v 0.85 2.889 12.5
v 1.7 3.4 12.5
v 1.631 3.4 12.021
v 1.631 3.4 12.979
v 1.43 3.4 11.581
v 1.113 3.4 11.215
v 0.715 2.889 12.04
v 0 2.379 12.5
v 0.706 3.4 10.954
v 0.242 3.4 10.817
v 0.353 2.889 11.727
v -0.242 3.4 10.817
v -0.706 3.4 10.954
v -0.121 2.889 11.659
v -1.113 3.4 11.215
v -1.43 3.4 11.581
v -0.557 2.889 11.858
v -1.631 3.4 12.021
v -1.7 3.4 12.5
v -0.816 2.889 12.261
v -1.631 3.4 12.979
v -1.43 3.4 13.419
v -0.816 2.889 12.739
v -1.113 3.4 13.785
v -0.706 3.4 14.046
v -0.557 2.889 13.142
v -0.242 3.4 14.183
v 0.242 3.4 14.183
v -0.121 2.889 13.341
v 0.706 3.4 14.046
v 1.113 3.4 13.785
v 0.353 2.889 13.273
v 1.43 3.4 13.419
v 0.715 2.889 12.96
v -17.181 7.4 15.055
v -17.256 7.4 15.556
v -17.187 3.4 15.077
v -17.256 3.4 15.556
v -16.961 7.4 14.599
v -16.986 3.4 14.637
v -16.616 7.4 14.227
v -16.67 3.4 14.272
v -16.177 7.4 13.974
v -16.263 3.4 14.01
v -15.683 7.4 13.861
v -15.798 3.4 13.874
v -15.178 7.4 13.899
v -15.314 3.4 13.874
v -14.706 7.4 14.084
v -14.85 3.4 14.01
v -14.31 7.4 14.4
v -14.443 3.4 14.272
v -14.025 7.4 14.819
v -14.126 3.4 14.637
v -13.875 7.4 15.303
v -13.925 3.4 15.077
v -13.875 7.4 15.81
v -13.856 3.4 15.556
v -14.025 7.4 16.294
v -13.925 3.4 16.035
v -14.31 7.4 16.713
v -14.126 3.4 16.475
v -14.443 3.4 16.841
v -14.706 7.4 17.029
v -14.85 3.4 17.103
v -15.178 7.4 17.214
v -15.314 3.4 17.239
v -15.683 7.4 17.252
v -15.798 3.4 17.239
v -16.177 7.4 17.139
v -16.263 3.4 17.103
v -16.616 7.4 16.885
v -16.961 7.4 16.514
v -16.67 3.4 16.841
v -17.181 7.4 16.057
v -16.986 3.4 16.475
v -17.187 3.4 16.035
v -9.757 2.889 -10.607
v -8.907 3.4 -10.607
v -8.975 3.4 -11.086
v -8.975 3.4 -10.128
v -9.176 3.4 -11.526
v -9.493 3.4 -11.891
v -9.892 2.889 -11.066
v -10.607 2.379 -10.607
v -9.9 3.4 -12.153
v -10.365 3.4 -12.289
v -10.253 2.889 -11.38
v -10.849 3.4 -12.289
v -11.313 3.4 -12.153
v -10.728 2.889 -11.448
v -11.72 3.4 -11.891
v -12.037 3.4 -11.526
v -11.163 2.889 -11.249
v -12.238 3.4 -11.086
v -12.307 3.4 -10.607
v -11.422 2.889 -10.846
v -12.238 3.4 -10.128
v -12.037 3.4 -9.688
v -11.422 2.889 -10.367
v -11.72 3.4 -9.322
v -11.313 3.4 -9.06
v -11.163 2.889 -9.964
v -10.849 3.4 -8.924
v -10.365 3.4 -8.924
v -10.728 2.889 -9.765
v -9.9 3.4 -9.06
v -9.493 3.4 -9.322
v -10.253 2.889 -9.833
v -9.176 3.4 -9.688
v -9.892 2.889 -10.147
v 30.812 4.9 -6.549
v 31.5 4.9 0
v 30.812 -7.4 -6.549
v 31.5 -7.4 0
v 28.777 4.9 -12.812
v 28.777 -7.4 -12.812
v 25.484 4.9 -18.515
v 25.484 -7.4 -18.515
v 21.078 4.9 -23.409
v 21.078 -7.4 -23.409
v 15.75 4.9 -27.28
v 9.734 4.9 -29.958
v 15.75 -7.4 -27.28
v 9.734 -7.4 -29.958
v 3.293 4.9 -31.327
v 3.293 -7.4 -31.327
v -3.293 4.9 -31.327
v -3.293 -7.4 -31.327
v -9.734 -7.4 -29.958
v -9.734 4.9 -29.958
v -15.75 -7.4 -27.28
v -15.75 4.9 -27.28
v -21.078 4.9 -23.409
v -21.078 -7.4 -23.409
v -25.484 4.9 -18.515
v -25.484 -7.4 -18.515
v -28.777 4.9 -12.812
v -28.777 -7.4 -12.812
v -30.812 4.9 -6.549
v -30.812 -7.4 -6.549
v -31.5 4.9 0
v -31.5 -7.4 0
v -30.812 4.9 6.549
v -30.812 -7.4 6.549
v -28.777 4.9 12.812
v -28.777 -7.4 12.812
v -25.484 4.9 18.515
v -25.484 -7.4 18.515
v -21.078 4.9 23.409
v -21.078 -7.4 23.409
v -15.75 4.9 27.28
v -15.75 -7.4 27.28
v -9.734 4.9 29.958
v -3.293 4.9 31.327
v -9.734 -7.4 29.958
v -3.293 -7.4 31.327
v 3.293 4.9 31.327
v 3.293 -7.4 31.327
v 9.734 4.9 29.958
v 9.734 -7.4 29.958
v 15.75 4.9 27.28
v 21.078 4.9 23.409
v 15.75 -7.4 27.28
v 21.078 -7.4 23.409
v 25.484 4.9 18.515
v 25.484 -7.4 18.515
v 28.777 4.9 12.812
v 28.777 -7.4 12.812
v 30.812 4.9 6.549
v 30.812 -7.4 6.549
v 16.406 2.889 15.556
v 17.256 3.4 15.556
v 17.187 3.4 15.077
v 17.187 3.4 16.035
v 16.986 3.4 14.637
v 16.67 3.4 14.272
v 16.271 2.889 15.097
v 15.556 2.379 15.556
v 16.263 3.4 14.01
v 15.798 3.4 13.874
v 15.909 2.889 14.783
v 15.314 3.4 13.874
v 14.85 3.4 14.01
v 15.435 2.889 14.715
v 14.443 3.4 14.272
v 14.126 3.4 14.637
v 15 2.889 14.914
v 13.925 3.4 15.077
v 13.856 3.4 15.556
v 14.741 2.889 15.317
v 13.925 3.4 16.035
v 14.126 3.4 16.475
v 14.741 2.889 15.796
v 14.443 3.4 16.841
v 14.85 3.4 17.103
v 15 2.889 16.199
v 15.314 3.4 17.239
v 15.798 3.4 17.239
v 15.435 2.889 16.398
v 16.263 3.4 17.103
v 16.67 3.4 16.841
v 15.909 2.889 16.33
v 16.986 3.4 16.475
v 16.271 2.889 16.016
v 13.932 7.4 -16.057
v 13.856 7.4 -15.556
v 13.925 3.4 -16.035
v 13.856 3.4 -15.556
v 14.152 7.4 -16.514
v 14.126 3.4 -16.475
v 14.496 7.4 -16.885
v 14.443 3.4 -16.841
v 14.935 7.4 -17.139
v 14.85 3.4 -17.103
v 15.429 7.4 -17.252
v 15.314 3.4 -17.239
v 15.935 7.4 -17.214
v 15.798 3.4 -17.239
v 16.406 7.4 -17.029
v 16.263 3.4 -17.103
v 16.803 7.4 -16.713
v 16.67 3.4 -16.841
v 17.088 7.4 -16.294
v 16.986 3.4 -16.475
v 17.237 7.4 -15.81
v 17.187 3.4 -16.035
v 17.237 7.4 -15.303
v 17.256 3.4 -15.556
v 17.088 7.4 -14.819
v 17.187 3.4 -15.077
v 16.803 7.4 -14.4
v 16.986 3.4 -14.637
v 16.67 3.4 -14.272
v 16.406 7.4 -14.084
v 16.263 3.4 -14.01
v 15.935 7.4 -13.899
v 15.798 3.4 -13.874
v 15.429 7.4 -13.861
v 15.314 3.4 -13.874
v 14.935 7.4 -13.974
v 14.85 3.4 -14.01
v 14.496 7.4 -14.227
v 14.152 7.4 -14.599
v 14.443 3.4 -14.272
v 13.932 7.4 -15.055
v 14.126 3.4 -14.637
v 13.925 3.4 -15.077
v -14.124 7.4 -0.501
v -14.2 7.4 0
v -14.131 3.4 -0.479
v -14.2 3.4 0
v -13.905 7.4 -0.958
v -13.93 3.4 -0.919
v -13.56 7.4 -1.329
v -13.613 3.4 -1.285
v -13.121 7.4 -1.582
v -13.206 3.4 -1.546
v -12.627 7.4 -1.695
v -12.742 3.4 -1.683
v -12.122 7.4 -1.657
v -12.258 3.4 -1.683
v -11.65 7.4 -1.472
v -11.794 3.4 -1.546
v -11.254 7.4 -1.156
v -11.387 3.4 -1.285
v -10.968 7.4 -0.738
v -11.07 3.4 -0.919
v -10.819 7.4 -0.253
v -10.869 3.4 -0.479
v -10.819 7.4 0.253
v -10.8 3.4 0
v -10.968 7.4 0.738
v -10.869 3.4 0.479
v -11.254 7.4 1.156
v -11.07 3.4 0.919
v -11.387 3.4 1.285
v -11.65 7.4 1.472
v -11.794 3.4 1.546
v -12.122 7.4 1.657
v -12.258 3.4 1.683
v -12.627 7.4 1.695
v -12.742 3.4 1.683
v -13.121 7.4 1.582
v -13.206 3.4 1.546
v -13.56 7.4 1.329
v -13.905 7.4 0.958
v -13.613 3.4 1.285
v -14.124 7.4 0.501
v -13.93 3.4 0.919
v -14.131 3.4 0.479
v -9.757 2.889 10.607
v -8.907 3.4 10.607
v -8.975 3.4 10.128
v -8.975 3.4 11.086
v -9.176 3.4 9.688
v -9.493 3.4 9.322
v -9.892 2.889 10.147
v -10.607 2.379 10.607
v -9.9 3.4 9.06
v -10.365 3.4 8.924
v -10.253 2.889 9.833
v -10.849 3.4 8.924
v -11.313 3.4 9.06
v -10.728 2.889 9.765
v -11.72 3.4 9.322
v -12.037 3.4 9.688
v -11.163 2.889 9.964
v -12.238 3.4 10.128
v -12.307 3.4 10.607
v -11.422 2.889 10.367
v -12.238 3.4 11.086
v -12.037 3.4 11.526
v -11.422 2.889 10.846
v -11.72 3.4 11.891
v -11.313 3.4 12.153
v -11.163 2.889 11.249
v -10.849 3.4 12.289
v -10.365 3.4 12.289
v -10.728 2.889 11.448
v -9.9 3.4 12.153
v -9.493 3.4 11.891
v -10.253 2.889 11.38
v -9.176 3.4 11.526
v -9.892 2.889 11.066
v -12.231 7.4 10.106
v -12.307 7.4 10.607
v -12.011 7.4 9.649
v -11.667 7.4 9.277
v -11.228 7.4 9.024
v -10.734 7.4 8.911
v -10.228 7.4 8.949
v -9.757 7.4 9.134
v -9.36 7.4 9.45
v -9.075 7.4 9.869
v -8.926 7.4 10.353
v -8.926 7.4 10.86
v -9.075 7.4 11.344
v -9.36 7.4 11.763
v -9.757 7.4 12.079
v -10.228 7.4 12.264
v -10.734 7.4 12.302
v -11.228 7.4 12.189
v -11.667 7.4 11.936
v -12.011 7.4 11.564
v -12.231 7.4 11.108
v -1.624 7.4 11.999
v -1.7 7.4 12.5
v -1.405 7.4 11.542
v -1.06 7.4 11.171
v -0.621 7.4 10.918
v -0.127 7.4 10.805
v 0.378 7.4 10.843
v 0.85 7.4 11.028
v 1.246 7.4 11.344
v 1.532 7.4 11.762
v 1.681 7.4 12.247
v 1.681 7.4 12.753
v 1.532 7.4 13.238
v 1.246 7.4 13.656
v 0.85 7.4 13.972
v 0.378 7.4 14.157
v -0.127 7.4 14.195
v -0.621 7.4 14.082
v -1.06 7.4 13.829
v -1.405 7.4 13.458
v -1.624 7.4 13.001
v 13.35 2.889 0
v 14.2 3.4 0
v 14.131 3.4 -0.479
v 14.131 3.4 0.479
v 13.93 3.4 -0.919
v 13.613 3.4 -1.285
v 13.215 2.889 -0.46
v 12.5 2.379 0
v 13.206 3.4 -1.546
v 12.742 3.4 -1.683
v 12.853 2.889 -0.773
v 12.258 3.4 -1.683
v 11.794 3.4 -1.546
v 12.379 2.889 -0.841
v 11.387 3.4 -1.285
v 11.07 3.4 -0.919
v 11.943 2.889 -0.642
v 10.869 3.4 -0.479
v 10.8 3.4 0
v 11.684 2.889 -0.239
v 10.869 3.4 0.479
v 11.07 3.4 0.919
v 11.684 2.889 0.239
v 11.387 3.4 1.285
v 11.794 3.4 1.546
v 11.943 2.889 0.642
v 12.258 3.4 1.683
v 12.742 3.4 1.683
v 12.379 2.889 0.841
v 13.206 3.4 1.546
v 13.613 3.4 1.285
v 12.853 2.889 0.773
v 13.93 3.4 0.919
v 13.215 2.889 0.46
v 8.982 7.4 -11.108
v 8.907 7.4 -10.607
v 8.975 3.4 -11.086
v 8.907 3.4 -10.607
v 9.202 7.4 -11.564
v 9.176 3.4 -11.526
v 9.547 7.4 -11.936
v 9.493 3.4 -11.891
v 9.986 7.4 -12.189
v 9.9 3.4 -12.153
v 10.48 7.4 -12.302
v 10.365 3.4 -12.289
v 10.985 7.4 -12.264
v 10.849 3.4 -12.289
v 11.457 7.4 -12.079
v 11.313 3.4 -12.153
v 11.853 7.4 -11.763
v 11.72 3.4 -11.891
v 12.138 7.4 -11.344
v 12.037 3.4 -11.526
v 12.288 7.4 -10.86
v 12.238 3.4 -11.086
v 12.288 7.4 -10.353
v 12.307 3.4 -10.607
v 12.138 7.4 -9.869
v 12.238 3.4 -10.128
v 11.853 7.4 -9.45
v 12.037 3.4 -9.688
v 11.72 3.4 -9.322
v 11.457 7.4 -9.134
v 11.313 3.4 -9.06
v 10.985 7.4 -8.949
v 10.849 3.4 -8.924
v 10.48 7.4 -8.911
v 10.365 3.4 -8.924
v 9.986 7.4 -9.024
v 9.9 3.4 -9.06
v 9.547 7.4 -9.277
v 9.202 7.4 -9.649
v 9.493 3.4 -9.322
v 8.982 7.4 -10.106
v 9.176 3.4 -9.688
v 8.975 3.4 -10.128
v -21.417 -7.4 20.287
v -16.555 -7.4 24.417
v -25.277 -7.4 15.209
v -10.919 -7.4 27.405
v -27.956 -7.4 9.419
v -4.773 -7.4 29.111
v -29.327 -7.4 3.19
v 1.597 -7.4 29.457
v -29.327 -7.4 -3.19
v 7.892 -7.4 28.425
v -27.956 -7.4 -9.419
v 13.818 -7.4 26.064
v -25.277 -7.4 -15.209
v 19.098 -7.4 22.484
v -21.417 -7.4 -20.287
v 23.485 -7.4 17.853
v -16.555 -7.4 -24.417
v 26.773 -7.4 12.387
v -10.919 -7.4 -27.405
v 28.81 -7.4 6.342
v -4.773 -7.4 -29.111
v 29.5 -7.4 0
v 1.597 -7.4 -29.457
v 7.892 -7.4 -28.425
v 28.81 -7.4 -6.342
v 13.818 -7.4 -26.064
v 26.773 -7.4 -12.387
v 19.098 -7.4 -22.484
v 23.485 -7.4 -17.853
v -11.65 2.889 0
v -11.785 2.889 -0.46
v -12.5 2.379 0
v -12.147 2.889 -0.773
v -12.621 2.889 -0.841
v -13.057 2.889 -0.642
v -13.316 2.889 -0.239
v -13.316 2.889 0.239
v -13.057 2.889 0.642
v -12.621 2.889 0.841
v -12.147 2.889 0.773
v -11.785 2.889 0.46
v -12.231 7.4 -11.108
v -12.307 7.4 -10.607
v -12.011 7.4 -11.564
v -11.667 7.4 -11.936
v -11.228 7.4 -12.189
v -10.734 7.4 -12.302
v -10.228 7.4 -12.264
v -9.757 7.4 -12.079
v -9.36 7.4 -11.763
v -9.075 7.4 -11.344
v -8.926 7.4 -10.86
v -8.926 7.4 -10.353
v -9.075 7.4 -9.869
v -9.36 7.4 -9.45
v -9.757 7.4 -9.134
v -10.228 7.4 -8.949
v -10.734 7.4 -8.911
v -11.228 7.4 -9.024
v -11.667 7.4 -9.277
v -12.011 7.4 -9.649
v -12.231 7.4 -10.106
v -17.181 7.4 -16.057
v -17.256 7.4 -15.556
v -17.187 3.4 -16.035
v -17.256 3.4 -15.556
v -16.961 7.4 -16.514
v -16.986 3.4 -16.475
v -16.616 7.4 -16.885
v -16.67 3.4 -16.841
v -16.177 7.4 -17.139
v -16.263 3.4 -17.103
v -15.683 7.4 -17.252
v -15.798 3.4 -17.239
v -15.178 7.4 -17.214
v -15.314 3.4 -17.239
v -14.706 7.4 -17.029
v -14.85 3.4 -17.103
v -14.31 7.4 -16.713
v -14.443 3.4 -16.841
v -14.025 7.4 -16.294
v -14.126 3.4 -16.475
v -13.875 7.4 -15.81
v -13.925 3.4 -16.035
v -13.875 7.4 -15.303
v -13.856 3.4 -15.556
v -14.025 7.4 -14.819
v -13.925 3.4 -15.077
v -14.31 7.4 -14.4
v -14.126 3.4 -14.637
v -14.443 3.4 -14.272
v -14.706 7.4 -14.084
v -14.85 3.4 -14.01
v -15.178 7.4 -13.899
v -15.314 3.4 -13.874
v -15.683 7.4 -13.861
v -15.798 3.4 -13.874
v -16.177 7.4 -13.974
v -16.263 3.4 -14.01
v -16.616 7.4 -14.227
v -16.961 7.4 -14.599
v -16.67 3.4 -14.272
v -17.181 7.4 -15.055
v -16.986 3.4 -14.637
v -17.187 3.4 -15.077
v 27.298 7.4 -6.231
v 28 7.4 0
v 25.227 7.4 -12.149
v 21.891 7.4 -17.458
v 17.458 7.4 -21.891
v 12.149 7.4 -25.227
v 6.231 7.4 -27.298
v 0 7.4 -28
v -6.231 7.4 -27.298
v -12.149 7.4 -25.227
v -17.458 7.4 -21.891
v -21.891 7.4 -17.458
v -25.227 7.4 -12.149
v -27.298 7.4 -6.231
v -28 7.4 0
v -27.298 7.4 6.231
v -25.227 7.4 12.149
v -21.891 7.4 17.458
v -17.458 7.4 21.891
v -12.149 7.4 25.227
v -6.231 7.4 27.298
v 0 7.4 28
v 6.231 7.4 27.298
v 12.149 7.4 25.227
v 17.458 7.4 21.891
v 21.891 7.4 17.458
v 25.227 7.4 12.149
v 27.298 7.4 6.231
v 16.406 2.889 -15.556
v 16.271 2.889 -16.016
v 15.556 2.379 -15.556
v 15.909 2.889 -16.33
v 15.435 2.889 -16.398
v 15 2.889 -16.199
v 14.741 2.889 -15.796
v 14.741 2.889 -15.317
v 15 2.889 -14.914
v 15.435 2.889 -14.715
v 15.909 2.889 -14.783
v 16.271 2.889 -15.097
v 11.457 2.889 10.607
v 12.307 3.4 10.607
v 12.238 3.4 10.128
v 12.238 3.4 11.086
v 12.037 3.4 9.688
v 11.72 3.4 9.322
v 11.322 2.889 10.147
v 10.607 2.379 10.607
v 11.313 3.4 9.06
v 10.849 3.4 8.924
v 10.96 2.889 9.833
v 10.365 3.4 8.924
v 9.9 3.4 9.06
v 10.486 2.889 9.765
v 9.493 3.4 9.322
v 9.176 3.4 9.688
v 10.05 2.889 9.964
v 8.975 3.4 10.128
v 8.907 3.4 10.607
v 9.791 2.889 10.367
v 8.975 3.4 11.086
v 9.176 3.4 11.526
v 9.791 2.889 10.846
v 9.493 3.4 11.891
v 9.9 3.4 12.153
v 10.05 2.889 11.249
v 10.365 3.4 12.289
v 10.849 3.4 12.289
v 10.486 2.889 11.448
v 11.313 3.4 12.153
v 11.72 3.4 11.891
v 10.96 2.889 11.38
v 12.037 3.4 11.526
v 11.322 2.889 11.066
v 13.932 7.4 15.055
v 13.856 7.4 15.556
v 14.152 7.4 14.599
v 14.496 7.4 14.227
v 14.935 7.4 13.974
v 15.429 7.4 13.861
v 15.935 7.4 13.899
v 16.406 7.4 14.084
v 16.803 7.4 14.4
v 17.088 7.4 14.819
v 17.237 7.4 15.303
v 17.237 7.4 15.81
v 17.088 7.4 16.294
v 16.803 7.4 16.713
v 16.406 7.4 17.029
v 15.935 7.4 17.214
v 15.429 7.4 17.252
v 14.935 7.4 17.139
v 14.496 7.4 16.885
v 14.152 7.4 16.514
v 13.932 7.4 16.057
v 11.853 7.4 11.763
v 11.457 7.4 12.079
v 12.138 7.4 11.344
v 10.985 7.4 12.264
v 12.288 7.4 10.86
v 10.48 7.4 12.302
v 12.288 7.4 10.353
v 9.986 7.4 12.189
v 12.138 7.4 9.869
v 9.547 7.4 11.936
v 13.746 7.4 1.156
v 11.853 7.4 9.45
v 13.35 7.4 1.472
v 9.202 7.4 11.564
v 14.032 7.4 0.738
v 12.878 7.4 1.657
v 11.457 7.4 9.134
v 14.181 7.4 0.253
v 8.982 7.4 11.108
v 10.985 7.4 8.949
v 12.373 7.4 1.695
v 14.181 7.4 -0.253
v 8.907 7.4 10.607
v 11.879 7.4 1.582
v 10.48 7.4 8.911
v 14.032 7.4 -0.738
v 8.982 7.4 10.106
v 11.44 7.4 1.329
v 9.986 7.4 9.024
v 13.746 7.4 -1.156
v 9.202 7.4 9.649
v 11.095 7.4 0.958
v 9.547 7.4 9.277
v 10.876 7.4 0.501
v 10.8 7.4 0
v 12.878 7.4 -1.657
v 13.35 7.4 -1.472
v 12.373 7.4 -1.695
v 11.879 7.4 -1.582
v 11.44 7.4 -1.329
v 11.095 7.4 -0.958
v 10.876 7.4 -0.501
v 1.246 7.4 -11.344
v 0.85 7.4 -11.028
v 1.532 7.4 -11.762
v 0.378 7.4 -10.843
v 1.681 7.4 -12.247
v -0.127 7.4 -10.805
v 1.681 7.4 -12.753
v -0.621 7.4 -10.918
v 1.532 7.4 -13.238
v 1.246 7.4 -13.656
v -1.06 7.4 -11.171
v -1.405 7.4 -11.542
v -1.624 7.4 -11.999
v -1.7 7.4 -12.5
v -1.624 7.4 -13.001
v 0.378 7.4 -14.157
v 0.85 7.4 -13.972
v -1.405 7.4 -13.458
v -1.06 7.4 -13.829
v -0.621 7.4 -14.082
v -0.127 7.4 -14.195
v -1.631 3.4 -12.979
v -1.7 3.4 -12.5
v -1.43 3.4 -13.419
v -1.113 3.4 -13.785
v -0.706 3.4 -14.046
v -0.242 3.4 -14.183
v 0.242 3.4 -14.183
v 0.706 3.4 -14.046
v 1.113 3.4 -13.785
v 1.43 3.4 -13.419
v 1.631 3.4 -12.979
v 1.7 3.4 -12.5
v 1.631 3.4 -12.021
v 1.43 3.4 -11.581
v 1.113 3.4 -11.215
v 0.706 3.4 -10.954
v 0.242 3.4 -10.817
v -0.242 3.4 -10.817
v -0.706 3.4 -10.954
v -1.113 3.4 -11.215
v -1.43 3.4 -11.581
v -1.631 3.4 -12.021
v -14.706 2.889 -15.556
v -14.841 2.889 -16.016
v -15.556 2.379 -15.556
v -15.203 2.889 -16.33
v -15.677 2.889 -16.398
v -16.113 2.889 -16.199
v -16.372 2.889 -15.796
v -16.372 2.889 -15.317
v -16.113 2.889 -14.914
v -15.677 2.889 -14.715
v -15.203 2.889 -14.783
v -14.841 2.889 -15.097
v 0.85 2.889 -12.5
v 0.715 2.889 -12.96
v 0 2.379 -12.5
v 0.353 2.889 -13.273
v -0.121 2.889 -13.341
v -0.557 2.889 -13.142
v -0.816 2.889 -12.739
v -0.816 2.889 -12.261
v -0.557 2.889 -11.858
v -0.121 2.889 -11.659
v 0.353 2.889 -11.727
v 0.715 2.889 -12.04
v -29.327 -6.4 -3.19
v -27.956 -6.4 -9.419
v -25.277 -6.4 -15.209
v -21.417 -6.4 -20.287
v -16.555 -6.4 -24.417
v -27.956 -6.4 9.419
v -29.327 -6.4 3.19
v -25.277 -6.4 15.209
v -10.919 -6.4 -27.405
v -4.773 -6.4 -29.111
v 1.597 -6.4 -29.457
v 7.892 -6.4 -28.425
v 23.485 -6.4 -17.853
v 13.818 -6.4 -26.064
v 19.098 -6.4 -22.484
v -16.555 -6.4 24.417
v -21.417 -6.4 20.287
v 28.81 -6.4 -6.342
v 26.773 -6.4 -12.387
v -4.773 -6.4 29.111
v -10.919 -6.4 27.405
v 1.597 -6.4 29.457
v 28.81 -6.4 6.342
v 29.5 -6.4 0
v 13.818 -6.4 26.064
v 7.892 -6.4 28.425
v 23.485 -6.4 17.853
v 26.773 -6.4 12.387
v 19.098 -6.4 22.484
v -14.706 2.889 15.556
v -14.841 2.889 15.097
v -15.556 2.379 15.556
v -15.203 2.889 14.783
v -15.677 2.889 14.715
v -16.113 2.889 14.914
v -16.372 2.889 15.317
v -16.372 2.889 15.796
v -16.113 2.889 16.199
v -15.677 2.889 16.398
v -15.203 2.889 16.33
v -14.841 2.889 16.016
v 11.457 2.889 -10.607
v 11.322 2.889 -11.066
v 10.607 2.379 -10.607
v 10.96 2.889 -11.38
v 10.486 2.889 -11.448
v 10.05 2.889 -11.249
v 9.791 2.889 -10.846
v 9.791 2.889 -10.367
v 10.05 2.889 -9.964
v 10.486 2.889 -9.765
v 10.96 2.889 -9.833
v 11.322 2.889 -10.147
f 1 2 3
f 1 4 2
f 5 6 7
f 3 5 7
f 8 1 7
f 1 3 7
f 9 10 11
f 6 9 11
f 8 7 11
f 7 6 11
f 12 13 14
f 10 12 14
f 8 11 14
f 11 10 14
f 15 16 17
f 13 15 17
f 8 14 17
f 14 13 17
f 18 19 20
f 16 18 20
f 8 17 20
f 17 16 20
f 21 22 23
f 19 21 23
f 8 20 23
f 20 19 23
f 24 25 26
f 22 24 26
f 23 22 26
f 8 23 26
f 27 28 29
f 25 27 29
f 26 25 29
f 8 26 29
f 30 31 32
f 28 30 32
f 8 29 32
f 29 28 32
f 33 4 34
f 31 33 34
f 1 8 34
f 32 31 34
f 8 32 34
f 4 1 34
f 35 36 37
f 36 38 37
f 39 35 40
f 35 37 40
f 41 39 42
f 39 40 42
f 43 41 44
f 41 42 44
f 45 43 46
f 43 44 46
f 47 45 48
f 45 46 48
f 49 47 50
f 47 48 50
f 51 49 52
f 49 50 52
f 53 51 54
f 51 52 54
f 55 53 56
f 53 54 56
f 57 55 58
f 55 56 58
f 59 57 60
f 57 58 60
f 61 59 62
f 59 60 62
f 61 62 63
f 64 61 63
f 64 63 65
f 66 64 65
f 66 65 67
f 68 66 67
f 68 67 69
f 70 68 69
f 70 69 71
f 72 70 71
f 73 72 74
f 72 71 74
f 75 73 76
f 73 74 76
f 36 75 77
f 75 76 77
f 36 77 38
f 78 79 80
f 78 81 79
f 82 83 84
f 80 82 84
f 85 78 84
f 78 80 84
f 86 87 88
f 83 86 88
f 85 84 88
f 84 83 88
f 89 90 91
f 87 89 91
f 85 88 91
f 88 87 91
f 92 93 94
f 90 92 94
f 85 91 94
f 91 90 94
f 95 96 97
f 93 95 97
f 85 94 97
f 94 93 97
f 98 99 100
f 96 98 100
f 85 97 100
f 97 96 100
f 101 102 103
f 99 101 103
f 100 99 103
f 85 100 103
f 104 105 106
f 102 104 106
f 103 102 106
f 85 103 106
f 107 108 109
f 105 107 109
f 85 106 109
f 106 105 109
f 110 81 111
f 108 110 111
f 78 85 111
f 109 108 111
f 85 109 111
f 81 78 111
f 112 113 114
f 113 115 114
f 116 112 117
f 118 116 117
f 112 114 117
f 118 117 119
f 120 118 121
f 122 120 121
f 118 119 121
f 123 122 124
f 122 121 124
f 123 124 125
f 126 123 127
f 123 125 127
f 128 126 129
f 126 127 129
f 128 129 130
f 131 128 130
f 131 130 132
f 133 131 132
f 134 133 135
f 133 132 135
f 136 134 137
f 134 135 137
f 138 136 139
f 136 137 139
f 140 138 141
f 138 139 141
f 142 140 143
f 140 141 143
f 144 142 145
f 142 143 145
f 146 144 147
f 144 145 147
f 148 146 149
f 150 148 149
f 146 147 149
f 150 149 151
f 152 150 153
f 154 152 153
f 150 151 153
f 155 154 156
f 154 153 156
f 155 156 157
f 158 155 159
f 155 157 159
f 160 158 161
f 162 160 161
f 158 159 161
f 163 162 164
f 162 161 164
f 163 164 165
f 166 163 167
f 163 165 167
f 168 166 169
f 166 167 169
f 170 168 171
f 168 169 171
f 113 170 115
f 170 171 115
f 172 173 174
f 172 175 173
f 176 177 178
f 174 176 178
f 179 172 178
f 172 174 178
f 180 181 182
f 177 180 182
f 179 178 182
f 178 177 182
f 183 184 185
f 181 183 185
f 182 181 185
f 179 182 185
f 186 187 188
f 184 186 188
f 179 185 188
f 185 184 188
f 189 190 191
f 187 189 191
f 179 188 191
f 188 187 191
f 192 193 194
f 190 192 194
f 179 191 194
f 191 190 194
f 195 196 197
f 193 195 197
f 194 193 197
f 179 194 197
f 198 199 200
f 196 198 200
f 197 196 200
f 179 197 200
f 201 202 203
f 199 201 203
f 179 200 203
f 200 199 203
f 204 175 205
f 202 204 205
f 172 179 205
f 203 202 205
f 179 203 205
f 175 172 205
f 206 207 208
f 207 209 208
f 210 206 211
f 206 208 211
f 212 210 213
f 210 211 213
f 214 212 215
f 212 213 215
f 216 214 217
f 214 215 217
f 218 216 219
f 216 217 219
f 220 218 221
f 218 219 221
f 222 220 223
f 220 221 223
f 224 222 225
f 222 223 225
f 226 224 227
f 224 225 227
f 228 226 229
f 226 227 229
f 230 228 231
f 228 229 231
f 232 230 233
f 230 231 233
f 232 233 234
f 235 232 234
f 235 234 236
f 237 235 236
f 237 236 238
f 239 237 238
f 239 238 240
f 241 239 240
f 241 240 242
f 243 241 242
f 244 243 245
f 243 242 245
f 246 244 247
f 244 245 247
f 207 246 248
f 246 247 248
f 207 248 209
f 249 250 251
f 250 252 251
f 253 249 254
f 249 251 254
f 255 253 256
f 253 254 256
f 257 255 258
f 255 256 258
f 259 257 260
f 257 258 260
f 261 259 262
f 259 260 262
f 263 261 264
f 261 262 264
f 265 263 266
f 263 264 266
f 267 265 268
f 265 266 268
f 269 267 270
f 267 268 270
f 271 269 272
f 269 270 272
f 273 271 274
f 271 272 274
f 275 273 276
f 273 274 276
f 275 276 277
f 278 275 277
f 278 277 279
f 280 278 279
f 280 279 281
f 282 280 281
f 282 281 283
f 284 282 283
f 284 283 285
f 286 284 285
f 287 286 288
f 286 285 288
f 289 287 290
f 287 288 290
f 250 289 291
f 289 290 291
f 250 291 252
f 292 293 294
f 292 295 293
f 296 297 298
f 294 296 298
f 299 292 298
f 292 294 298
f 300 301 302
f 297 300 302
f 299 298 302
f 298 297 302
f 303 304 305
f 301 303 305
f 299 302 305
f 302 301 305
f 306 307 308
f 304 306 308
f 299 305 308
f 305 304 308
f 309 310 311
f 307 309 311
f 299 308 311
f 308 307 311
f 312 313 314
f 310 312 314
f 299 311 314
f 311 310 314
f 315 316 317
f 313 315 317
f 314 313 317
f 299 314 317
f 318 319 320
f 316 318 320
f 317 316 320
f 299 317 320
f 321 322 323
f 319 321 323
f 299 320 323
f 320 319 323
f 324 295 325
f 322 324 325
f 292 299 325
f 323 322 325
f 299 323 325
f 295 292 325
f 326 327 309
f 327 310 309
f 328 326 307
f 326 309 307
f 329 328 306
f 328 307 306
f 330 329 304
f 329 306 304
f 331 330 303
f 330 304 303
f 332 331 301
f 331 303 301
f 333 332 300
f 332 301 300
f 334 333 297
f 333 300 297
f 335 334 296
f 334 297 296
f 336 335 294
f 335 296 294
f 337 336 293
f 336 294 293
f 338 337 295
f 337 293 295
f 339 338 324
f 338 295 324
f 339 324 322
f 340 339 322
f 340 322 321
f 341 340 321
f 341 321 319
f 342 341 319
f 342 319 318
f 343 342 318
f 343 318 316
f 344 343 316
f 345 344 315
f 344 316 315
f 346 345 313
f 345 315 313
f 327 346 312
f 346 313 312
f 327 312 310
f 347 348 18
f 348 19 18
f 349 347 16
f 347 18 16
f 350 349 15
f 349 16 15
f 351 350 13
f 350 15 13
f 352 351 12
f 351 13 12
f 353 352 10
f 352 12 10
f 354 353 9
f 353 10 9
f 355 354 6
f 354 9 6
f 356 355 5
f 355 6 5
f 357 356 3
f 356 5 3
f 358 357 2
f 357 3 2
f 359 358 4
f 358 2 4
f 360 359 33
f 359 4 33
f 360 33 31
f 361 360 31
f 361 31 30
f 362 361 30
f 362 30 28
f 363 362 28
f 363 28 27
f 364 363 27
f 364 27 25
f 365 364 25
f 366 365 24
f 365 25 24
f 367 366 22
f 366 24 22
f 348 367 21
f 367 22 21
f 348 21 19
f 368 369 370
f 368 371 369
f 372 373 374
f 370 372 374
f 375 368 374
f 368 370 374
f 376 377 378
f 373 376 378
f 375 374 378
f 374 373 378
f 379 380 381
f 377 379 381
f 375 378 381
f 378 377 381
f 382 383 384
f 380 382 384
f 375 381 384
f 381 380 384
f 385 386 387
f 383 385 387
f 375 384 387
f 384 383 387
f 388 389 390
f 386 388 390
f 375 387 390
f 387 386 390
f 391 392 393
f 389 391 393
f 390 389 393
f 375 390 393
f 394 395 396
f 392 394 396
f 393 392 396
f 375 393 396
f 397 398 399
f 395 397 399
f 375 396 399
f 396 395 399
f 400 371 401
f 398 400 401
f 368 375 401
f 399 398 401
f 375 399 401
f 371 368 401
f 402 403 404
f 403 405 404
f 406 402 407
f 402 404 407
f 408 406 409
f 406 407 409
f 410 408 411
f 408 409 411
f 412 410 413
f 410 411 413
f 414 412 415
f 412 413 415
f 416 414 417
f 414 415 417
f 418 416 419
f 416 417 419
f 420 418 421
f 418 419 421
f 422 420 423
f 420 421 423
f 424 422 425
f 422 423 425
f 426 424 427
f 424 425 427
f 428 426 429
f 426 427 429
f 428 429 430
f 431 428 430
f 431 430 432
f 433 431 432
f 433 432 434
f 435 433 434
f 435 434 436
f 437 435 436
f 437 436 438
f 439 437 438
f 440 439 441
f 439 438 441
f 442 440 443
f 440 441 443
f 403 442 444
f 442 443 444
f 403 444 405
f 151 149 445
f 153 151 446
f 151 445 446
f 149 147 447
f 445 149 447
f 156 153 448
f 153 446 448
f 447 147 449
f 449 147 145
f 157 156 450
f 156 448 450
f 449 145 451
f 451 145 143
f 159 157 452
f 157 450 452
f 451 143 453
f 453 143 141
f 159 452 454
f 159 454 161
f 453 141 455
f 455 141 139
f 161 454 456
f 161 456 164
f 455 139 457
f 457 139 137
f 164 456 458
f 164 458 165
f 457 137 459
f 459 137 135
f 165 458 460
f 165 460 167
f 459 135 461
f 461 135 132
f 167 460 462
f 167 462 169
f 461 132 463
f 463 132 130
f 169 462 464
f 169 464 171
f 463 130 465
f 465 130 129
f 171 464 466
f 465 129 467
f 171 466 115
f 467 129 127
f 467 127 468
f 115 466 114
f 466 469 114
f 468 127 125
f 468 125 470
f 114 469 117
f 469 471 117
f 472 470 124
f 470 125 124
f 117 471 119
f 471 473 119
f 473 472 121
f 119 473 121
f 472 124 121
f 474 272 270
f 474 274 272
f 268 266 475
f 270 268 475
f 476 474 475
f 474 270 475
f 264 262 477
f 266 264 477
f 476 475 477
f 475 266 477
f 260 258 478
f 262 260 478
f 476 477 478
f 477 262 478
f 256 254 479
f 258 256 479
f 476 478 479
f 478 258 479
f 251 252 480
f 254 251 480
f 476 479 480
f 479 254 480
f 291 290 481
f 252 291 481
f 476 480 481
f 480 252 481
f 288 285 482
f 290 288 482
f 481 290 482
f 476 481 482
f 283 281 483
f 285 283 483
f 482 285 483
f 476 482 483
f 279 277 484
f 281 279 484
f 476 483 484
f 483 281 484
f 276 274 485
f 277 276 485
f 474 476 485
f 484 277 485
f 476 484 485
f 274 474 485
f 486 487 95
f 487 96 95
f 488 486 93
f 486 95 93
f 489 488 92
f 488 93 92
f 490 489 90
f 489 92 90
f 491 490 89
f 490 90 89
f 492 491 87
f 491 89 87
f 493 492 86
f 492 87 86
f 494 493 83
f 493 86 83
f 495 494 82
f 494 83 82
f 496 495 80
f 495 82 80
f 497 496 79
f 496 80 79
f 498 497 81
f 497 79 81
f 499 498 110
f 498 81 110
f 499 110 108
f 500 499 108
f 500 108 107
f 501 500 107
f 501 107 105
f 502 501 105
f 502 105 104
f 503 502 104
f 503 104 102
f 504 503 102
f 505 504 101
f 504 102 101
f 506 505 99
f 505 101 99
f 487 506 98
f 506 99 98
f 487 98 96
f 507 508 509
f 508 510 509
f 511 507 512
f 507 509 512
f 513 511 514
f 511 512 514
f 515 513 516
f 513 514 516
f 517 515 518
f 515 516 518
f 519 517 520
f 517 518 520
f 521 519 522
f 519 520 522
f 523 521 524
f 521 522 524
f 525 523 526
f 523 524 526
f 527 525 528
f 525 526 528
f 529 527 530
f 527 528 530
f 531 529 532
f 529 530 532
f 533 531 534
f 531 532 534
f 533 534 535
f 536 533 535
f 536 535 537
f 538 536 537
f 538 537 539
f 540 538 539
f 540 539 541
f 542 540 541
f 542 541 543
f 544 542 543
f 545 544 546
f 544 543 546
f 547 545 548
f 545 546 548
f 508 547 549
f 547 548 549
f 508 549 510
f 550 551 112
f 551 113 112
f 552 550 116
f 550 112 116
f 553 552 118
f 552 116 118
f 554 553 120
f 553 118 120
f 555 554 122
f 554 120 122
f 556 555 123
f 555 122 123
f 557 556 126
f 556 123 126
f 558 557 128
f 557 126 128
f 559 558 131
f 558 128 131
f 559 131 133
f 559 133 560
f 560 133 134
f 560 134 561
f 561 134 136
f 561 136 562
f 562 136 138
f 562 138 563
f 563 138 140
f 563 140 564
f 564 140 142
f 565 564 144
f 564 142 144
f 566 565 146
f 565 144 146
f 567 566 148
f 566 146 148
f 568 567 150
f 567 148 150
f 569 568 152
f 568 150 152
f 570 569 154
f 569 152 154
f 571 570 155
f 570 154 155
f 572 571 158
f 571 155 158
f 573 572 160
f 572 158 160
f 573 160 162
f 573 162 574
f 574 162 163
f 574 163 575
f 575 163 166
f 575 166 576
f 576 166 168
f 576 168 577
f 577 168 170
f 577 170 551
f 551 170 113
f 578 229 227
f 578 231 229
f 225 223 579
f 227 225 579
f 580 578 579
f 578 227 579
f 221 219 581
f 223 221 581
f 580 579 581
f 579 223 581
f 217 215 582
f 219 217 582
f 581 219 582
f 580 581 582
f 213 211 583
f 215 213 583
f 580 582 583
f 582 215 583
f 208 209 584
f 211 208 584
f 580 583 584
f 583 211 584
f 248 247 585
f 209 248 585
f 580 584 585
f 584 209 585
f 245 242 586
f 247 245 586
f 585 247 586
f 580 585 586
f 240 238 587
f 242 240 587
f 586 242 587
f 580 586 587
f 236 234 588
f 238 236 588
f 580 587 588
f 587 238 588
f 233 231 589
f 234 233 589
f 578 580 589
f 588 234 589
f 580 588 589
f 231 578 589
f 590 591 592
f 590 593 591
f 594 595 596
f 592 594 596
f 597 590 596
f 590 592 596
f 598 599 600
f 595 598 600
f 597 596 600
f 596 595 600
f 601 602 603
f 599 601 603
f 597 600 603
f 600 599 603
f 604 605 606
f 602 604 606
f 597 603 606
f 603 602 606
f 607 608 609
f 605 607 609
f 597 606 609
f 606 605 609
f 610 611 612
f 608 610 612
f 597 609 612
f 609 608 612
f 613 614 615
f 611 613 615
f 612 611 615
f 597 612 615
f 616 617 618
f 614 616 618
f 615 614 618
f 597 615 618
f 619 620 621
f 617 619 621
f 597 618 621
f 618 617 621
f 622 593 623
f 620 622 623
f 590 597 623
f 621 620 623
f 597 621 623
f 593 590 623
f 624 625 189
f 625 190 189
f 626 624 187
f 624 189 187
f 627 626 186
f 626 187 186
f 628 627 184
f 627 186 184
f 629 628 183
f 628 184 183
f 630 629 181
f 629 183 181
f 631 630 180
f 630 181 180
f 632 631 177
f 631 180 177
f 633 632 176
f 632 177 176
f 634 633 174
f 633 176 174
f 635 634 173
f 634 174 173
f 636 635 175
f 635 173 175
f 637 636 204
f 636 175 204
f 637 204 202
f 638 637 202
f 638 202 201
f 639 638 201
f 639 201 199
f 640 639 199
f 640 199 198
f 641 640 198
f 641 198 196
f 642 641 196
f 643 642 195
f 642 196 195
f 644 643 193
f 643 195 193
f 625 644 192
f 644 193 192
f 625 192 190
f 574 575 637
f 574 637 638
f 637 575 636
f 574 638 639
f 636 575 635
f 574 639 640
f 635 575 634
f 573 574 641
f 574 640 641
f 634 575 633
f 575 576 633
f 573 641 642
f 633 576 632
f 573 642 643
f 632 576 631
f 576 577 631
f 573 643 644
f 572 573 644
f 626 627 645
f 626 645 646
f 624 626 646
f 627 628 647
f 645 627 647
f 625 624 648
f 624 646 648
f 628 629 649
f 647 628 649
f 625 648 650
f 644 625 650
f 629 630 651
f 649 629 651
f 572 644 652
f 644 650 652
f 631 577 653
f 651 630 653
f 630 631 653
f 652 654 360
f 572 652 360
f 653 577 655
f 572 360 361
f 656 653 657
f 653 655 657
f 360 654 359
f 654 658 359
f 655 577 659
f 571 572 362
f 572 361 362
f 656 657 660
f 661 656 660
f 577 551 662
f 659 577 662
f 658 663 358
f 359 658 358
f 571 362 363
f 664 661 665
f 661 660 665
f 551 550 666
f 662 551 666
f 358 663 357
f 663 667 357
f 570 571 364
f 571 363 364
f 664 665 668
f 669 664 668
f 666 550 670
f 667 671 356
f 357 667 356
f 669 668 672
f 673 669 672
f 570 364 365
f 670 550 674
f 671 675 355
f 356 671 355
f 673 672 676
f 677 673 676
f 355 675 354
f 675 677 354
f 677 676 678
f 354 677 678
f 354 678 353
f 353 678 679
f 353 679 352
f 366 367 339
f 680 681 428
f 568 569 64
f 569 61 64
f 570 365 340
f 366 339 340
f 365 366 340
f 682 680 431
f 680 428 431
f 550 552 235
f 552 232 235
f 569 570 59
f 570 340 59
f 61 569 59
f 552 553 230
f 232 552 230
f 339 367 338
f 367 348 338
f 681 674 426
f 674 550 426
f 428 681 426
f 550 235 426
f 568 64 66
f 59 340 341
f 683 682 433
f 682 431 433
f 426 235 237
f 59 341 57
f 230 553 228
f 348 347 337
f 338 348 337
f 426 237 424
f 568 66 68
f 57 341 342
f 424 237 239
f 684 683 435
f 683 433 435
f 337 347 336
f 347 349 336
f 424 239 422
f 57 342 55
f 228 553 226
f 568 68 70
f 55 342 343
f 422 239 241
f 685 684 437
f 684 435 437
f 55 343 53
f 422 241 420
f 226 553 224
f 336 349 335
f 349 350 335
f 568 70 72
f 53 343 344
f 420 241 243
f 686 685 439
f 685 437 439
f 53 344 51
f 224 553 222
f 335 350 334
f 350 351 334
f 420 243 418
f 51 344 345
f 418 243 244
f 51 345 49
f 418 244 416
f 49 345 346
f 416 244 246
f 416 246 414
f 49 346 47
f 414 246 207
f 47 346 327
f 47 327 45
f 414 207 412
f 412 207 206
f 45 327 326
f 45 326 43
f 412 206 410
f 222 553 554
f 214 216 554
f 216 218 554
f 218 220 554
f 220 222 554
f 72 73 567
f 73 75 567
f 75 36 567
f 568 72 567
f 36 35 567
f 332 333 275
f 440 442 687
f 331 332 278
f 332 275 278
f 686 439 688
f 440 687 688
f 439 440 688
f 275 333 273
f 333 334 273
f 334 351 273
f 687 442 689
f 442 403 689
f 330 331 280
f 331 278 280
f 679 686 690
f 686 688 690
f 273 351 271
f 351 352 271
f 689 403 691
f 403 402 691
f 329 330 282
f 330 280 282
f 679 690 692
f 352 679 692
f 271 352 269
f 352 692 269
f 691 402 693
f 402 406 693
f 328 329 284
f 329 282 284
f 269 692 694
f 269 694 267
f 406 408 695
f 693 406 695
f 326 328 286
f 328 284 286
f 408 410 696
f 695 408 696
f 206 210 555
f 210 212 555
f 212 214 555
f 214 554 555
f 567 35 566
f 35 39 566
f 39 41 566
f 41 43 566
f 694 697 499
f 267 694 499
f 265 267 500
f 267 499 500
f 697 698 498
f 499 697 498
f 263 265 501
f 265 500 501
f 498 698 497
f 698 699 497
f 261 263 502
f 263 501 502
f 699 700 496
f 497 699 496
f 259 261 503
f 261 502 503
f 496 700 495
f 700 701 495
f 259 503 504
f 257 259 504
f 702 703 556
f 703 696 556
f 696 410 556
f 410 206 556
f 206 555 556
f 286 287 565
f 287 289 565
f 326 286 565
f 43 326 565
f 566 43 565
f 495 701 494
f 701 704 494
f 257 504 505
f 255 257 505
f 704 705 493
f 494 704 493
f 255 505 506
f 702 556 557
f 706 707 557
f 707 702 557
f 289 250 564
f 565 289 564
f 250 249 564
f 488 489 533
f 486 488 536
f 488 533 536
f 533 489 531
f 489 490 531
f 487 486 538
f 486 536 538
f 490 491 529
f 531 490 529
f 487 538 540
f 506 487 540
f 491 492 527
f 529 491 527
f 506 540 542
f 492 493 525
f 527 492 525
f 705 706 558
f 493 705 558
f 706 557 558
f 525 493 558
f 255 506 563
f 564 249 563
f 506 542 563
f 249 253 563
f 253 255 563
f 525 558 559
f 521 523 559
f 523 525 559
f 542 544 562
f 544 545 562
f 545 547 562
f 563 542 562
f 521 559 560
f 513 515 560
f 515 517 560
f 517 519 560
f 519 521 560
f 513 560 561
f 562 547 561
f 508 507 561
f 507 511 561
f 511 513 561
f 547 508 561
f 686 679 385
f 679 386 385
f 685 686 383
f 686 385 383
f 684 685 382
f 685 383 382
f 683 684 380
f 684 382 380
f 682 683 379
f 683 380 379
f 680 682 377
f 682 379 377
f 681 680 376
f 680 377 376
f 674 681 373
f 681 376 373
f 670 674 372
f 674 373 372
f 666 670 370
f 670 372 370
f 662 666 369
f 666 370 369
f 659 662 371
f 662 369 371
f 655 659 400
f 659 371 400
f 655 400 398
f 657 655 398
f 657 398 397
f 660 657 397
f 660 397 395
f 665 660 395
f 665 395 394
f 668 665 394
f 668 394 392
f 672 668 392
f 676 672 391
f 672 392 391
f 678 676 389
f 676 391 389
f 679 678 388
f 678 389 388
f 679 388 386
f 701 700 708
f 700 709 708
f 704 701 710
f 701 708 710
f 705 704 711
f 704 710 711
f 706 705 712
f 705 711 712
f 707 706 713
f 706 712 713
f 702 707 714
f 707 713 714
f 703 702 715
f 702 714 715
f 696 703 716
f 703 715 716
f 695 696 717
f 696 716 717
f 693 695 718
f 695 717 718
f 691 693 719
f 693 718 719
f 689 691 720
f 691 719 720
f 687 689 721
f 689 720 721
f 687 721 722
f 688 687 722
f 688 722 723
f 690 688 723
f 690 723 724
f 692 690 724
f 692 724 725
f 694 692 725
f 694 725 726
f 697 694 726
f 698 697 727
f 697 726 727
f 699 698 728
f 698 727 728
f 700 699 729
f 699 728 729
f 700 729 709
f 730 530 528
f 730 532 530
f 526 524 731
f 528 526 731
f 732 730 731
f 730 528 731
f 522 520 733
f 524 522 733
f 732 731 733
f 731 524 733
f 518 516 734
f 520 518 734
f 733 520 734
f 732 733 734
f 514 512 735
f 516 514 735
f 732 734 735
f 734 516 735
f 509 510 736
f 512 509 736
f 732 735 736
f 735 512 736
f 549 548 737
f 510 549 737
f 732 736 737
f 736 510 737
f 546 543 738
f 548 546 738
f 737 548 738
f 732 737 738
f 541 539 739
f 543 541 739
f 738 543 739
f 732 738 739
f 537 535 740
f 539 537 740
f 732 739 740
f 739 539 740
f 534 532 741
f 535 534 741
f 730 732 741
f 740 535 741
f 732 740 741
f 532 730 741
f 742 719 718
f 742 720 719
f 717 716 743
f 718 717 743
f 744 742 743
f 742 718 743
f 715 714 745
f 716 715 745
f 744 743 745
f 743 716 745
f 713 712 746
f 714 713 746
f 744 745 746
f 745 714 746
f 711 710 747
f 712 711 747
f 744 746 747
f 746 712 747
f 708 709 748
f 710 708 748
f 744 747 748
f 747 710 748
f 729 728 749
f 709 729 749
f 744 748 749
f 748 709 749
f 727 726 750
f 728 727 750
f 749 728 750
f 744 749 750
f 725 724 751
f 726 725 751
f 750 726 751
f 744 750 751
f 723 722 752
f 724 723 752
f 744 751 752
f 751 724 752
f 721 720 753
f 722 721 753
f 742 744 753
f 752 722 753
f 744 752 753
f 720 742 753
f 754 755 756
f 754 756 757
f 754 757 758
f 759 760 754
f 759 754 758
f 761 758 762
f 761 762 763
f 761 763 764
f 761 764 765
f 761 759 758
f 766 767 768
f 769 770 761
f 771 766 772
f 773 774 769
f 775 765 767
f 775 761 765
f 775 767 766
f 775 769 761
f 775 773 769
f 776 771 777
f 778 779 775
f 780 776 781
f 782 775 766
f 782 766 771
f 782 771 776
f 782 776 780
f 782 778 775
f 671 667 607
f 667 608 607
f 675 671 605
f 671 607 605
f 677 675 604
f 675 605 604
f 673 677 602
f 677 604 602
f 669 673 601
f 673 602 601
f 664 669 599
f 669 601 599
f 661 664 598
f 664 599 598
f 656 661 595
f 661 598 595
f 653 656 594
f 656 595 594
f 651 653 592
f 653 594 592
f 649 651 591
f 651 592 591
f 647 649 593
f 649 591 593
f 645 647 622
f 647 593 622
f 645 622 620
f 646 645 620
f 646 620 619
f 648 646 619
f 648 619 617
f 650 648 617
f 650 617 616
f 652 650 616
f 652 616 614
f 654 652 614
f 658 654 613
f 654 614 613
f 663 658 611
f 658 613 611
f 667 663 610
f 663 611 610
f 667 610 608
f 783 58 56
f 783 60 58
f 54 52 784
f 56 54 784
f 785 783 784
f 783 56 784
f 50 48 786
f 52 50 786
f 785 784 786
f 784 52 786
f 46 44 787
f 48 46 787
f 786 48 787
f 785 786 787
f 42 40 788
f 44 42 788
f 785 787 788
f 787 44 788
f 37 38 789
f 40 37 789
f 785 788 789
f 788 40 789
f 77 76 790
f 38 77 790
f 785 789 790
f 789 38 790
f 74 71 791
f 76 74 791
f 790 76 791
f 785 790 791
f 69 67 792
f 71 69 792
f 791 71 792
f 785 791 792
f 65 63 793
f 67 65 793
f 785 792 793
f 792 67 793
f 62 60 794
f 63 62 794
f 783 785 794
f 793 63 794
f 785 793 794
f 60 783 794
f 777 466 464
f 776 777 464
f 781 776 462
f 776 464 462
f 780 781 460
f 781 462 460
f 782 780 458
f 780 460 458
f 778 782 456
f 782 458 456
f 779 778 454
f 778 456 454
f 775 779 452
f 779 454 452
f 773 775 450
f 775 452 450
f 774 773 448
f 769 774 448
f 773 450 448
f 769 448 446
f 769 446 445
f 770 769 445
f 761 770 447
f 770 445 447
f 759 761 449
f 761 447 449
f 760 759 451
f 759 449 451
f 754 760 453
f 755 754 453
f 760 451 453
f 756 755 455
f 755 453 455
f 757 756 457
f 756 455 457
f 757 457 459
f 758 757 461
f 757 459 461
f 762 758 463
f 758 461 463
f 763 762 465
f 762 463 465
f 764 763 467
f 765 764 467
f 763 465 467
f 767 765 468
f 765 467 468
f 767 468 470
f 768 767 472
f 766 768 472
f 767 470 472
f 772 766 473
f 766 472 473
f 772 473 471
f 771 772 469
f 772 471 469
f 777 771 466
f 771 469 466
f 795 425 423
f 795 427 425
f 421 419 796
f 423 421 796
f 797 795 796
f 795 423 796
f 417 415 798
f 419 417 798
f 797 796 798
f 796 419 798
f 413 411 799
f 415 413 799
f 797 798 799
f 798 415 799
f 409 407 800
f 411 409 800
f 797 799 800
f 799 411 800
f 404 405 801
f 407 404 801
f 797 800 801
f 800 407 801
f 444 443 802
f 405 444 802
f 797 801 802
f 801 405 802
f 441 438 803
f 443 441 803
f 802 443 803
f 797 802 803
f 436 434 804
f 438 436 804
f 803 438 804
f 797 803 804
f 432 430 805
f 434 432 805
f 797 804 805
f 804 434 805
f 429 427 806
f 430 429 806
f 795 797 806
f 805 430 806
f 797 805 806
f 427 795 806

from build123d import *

# Parameters (mm, degrees)
M3_CLEARANCE_HOLE1_D     = 3.4
M3_CLEARANCE_HOLE1_DEPTH = 4
M3_CLEARANCE_HOLE1_TIP   = 1.021463052
SKETCH5_R                = 29.5
CUT_EXTRUDE1_DEPTH       = 1


with BuildPart() as part:
    # Sketch1 → Revolve1 (revolve)
    with BuildSketch(Plane.XY, mode=Mode.PRIVATE) as revolve1_sk:
        Polygon((0, -7.4), (0, 7.4), (-28, 7.4), (-31.5, 4.9), (-31.5, -7.4), align=None)
    revolve(revolve1_sk.sketch.rotate(Axis((0, -7.4, 0), (0, 1, 0)), 180), axis=Axis((0, -7.4, 0), (0, 1, 0)))

    # M3 Clearance Hole1
    with Locations(Plane(origin=(0, 7.4, 0), x_dir=(1, 0, 0), z_dir=(0, 1, 0))):
        with Locations((-15.556349186, 15.556349186), (-10.606601718, 10.606601718), (0, 12.5), (10.606601718, 10.606601718), (15.556349186, 15.556349186), (0, -12.5), (-12.5, 0), (12.5, 0), (10.606601718, -10.606601718), (-10.606601718, -10.606601718), (-15.556349186, -15.556349186), (15.556349186, -15.556349186)):
            Hole(M3_CLEARANCE_HOLE1_D / 2, depth=M3_CLEARANCE_HOLE1_DEPTH)
            with Locations((0, 0, -(M3_CLEARANCE_HOLE1_DEPTH + M3_CLEARANCE_HOLE1_TIP / 2))):  # 118° drill point
                Cone(0, M3_CLEARANCE_HOLE1_D / 2, M3_CLEARANCE_HOLE1_TIP, mode=Mode.SUBTRACT)

    # Sketch5 → Cut-Extrude1 (cut)
    with BuildSketch(Plane.XZ.offset(7.4)):
        Circle(SKETCH5_R)
    extrude(amount=-CUT_EXTRUDE1_DEPTH, mode=Mode.SUBTRACT)


solid = part.part
